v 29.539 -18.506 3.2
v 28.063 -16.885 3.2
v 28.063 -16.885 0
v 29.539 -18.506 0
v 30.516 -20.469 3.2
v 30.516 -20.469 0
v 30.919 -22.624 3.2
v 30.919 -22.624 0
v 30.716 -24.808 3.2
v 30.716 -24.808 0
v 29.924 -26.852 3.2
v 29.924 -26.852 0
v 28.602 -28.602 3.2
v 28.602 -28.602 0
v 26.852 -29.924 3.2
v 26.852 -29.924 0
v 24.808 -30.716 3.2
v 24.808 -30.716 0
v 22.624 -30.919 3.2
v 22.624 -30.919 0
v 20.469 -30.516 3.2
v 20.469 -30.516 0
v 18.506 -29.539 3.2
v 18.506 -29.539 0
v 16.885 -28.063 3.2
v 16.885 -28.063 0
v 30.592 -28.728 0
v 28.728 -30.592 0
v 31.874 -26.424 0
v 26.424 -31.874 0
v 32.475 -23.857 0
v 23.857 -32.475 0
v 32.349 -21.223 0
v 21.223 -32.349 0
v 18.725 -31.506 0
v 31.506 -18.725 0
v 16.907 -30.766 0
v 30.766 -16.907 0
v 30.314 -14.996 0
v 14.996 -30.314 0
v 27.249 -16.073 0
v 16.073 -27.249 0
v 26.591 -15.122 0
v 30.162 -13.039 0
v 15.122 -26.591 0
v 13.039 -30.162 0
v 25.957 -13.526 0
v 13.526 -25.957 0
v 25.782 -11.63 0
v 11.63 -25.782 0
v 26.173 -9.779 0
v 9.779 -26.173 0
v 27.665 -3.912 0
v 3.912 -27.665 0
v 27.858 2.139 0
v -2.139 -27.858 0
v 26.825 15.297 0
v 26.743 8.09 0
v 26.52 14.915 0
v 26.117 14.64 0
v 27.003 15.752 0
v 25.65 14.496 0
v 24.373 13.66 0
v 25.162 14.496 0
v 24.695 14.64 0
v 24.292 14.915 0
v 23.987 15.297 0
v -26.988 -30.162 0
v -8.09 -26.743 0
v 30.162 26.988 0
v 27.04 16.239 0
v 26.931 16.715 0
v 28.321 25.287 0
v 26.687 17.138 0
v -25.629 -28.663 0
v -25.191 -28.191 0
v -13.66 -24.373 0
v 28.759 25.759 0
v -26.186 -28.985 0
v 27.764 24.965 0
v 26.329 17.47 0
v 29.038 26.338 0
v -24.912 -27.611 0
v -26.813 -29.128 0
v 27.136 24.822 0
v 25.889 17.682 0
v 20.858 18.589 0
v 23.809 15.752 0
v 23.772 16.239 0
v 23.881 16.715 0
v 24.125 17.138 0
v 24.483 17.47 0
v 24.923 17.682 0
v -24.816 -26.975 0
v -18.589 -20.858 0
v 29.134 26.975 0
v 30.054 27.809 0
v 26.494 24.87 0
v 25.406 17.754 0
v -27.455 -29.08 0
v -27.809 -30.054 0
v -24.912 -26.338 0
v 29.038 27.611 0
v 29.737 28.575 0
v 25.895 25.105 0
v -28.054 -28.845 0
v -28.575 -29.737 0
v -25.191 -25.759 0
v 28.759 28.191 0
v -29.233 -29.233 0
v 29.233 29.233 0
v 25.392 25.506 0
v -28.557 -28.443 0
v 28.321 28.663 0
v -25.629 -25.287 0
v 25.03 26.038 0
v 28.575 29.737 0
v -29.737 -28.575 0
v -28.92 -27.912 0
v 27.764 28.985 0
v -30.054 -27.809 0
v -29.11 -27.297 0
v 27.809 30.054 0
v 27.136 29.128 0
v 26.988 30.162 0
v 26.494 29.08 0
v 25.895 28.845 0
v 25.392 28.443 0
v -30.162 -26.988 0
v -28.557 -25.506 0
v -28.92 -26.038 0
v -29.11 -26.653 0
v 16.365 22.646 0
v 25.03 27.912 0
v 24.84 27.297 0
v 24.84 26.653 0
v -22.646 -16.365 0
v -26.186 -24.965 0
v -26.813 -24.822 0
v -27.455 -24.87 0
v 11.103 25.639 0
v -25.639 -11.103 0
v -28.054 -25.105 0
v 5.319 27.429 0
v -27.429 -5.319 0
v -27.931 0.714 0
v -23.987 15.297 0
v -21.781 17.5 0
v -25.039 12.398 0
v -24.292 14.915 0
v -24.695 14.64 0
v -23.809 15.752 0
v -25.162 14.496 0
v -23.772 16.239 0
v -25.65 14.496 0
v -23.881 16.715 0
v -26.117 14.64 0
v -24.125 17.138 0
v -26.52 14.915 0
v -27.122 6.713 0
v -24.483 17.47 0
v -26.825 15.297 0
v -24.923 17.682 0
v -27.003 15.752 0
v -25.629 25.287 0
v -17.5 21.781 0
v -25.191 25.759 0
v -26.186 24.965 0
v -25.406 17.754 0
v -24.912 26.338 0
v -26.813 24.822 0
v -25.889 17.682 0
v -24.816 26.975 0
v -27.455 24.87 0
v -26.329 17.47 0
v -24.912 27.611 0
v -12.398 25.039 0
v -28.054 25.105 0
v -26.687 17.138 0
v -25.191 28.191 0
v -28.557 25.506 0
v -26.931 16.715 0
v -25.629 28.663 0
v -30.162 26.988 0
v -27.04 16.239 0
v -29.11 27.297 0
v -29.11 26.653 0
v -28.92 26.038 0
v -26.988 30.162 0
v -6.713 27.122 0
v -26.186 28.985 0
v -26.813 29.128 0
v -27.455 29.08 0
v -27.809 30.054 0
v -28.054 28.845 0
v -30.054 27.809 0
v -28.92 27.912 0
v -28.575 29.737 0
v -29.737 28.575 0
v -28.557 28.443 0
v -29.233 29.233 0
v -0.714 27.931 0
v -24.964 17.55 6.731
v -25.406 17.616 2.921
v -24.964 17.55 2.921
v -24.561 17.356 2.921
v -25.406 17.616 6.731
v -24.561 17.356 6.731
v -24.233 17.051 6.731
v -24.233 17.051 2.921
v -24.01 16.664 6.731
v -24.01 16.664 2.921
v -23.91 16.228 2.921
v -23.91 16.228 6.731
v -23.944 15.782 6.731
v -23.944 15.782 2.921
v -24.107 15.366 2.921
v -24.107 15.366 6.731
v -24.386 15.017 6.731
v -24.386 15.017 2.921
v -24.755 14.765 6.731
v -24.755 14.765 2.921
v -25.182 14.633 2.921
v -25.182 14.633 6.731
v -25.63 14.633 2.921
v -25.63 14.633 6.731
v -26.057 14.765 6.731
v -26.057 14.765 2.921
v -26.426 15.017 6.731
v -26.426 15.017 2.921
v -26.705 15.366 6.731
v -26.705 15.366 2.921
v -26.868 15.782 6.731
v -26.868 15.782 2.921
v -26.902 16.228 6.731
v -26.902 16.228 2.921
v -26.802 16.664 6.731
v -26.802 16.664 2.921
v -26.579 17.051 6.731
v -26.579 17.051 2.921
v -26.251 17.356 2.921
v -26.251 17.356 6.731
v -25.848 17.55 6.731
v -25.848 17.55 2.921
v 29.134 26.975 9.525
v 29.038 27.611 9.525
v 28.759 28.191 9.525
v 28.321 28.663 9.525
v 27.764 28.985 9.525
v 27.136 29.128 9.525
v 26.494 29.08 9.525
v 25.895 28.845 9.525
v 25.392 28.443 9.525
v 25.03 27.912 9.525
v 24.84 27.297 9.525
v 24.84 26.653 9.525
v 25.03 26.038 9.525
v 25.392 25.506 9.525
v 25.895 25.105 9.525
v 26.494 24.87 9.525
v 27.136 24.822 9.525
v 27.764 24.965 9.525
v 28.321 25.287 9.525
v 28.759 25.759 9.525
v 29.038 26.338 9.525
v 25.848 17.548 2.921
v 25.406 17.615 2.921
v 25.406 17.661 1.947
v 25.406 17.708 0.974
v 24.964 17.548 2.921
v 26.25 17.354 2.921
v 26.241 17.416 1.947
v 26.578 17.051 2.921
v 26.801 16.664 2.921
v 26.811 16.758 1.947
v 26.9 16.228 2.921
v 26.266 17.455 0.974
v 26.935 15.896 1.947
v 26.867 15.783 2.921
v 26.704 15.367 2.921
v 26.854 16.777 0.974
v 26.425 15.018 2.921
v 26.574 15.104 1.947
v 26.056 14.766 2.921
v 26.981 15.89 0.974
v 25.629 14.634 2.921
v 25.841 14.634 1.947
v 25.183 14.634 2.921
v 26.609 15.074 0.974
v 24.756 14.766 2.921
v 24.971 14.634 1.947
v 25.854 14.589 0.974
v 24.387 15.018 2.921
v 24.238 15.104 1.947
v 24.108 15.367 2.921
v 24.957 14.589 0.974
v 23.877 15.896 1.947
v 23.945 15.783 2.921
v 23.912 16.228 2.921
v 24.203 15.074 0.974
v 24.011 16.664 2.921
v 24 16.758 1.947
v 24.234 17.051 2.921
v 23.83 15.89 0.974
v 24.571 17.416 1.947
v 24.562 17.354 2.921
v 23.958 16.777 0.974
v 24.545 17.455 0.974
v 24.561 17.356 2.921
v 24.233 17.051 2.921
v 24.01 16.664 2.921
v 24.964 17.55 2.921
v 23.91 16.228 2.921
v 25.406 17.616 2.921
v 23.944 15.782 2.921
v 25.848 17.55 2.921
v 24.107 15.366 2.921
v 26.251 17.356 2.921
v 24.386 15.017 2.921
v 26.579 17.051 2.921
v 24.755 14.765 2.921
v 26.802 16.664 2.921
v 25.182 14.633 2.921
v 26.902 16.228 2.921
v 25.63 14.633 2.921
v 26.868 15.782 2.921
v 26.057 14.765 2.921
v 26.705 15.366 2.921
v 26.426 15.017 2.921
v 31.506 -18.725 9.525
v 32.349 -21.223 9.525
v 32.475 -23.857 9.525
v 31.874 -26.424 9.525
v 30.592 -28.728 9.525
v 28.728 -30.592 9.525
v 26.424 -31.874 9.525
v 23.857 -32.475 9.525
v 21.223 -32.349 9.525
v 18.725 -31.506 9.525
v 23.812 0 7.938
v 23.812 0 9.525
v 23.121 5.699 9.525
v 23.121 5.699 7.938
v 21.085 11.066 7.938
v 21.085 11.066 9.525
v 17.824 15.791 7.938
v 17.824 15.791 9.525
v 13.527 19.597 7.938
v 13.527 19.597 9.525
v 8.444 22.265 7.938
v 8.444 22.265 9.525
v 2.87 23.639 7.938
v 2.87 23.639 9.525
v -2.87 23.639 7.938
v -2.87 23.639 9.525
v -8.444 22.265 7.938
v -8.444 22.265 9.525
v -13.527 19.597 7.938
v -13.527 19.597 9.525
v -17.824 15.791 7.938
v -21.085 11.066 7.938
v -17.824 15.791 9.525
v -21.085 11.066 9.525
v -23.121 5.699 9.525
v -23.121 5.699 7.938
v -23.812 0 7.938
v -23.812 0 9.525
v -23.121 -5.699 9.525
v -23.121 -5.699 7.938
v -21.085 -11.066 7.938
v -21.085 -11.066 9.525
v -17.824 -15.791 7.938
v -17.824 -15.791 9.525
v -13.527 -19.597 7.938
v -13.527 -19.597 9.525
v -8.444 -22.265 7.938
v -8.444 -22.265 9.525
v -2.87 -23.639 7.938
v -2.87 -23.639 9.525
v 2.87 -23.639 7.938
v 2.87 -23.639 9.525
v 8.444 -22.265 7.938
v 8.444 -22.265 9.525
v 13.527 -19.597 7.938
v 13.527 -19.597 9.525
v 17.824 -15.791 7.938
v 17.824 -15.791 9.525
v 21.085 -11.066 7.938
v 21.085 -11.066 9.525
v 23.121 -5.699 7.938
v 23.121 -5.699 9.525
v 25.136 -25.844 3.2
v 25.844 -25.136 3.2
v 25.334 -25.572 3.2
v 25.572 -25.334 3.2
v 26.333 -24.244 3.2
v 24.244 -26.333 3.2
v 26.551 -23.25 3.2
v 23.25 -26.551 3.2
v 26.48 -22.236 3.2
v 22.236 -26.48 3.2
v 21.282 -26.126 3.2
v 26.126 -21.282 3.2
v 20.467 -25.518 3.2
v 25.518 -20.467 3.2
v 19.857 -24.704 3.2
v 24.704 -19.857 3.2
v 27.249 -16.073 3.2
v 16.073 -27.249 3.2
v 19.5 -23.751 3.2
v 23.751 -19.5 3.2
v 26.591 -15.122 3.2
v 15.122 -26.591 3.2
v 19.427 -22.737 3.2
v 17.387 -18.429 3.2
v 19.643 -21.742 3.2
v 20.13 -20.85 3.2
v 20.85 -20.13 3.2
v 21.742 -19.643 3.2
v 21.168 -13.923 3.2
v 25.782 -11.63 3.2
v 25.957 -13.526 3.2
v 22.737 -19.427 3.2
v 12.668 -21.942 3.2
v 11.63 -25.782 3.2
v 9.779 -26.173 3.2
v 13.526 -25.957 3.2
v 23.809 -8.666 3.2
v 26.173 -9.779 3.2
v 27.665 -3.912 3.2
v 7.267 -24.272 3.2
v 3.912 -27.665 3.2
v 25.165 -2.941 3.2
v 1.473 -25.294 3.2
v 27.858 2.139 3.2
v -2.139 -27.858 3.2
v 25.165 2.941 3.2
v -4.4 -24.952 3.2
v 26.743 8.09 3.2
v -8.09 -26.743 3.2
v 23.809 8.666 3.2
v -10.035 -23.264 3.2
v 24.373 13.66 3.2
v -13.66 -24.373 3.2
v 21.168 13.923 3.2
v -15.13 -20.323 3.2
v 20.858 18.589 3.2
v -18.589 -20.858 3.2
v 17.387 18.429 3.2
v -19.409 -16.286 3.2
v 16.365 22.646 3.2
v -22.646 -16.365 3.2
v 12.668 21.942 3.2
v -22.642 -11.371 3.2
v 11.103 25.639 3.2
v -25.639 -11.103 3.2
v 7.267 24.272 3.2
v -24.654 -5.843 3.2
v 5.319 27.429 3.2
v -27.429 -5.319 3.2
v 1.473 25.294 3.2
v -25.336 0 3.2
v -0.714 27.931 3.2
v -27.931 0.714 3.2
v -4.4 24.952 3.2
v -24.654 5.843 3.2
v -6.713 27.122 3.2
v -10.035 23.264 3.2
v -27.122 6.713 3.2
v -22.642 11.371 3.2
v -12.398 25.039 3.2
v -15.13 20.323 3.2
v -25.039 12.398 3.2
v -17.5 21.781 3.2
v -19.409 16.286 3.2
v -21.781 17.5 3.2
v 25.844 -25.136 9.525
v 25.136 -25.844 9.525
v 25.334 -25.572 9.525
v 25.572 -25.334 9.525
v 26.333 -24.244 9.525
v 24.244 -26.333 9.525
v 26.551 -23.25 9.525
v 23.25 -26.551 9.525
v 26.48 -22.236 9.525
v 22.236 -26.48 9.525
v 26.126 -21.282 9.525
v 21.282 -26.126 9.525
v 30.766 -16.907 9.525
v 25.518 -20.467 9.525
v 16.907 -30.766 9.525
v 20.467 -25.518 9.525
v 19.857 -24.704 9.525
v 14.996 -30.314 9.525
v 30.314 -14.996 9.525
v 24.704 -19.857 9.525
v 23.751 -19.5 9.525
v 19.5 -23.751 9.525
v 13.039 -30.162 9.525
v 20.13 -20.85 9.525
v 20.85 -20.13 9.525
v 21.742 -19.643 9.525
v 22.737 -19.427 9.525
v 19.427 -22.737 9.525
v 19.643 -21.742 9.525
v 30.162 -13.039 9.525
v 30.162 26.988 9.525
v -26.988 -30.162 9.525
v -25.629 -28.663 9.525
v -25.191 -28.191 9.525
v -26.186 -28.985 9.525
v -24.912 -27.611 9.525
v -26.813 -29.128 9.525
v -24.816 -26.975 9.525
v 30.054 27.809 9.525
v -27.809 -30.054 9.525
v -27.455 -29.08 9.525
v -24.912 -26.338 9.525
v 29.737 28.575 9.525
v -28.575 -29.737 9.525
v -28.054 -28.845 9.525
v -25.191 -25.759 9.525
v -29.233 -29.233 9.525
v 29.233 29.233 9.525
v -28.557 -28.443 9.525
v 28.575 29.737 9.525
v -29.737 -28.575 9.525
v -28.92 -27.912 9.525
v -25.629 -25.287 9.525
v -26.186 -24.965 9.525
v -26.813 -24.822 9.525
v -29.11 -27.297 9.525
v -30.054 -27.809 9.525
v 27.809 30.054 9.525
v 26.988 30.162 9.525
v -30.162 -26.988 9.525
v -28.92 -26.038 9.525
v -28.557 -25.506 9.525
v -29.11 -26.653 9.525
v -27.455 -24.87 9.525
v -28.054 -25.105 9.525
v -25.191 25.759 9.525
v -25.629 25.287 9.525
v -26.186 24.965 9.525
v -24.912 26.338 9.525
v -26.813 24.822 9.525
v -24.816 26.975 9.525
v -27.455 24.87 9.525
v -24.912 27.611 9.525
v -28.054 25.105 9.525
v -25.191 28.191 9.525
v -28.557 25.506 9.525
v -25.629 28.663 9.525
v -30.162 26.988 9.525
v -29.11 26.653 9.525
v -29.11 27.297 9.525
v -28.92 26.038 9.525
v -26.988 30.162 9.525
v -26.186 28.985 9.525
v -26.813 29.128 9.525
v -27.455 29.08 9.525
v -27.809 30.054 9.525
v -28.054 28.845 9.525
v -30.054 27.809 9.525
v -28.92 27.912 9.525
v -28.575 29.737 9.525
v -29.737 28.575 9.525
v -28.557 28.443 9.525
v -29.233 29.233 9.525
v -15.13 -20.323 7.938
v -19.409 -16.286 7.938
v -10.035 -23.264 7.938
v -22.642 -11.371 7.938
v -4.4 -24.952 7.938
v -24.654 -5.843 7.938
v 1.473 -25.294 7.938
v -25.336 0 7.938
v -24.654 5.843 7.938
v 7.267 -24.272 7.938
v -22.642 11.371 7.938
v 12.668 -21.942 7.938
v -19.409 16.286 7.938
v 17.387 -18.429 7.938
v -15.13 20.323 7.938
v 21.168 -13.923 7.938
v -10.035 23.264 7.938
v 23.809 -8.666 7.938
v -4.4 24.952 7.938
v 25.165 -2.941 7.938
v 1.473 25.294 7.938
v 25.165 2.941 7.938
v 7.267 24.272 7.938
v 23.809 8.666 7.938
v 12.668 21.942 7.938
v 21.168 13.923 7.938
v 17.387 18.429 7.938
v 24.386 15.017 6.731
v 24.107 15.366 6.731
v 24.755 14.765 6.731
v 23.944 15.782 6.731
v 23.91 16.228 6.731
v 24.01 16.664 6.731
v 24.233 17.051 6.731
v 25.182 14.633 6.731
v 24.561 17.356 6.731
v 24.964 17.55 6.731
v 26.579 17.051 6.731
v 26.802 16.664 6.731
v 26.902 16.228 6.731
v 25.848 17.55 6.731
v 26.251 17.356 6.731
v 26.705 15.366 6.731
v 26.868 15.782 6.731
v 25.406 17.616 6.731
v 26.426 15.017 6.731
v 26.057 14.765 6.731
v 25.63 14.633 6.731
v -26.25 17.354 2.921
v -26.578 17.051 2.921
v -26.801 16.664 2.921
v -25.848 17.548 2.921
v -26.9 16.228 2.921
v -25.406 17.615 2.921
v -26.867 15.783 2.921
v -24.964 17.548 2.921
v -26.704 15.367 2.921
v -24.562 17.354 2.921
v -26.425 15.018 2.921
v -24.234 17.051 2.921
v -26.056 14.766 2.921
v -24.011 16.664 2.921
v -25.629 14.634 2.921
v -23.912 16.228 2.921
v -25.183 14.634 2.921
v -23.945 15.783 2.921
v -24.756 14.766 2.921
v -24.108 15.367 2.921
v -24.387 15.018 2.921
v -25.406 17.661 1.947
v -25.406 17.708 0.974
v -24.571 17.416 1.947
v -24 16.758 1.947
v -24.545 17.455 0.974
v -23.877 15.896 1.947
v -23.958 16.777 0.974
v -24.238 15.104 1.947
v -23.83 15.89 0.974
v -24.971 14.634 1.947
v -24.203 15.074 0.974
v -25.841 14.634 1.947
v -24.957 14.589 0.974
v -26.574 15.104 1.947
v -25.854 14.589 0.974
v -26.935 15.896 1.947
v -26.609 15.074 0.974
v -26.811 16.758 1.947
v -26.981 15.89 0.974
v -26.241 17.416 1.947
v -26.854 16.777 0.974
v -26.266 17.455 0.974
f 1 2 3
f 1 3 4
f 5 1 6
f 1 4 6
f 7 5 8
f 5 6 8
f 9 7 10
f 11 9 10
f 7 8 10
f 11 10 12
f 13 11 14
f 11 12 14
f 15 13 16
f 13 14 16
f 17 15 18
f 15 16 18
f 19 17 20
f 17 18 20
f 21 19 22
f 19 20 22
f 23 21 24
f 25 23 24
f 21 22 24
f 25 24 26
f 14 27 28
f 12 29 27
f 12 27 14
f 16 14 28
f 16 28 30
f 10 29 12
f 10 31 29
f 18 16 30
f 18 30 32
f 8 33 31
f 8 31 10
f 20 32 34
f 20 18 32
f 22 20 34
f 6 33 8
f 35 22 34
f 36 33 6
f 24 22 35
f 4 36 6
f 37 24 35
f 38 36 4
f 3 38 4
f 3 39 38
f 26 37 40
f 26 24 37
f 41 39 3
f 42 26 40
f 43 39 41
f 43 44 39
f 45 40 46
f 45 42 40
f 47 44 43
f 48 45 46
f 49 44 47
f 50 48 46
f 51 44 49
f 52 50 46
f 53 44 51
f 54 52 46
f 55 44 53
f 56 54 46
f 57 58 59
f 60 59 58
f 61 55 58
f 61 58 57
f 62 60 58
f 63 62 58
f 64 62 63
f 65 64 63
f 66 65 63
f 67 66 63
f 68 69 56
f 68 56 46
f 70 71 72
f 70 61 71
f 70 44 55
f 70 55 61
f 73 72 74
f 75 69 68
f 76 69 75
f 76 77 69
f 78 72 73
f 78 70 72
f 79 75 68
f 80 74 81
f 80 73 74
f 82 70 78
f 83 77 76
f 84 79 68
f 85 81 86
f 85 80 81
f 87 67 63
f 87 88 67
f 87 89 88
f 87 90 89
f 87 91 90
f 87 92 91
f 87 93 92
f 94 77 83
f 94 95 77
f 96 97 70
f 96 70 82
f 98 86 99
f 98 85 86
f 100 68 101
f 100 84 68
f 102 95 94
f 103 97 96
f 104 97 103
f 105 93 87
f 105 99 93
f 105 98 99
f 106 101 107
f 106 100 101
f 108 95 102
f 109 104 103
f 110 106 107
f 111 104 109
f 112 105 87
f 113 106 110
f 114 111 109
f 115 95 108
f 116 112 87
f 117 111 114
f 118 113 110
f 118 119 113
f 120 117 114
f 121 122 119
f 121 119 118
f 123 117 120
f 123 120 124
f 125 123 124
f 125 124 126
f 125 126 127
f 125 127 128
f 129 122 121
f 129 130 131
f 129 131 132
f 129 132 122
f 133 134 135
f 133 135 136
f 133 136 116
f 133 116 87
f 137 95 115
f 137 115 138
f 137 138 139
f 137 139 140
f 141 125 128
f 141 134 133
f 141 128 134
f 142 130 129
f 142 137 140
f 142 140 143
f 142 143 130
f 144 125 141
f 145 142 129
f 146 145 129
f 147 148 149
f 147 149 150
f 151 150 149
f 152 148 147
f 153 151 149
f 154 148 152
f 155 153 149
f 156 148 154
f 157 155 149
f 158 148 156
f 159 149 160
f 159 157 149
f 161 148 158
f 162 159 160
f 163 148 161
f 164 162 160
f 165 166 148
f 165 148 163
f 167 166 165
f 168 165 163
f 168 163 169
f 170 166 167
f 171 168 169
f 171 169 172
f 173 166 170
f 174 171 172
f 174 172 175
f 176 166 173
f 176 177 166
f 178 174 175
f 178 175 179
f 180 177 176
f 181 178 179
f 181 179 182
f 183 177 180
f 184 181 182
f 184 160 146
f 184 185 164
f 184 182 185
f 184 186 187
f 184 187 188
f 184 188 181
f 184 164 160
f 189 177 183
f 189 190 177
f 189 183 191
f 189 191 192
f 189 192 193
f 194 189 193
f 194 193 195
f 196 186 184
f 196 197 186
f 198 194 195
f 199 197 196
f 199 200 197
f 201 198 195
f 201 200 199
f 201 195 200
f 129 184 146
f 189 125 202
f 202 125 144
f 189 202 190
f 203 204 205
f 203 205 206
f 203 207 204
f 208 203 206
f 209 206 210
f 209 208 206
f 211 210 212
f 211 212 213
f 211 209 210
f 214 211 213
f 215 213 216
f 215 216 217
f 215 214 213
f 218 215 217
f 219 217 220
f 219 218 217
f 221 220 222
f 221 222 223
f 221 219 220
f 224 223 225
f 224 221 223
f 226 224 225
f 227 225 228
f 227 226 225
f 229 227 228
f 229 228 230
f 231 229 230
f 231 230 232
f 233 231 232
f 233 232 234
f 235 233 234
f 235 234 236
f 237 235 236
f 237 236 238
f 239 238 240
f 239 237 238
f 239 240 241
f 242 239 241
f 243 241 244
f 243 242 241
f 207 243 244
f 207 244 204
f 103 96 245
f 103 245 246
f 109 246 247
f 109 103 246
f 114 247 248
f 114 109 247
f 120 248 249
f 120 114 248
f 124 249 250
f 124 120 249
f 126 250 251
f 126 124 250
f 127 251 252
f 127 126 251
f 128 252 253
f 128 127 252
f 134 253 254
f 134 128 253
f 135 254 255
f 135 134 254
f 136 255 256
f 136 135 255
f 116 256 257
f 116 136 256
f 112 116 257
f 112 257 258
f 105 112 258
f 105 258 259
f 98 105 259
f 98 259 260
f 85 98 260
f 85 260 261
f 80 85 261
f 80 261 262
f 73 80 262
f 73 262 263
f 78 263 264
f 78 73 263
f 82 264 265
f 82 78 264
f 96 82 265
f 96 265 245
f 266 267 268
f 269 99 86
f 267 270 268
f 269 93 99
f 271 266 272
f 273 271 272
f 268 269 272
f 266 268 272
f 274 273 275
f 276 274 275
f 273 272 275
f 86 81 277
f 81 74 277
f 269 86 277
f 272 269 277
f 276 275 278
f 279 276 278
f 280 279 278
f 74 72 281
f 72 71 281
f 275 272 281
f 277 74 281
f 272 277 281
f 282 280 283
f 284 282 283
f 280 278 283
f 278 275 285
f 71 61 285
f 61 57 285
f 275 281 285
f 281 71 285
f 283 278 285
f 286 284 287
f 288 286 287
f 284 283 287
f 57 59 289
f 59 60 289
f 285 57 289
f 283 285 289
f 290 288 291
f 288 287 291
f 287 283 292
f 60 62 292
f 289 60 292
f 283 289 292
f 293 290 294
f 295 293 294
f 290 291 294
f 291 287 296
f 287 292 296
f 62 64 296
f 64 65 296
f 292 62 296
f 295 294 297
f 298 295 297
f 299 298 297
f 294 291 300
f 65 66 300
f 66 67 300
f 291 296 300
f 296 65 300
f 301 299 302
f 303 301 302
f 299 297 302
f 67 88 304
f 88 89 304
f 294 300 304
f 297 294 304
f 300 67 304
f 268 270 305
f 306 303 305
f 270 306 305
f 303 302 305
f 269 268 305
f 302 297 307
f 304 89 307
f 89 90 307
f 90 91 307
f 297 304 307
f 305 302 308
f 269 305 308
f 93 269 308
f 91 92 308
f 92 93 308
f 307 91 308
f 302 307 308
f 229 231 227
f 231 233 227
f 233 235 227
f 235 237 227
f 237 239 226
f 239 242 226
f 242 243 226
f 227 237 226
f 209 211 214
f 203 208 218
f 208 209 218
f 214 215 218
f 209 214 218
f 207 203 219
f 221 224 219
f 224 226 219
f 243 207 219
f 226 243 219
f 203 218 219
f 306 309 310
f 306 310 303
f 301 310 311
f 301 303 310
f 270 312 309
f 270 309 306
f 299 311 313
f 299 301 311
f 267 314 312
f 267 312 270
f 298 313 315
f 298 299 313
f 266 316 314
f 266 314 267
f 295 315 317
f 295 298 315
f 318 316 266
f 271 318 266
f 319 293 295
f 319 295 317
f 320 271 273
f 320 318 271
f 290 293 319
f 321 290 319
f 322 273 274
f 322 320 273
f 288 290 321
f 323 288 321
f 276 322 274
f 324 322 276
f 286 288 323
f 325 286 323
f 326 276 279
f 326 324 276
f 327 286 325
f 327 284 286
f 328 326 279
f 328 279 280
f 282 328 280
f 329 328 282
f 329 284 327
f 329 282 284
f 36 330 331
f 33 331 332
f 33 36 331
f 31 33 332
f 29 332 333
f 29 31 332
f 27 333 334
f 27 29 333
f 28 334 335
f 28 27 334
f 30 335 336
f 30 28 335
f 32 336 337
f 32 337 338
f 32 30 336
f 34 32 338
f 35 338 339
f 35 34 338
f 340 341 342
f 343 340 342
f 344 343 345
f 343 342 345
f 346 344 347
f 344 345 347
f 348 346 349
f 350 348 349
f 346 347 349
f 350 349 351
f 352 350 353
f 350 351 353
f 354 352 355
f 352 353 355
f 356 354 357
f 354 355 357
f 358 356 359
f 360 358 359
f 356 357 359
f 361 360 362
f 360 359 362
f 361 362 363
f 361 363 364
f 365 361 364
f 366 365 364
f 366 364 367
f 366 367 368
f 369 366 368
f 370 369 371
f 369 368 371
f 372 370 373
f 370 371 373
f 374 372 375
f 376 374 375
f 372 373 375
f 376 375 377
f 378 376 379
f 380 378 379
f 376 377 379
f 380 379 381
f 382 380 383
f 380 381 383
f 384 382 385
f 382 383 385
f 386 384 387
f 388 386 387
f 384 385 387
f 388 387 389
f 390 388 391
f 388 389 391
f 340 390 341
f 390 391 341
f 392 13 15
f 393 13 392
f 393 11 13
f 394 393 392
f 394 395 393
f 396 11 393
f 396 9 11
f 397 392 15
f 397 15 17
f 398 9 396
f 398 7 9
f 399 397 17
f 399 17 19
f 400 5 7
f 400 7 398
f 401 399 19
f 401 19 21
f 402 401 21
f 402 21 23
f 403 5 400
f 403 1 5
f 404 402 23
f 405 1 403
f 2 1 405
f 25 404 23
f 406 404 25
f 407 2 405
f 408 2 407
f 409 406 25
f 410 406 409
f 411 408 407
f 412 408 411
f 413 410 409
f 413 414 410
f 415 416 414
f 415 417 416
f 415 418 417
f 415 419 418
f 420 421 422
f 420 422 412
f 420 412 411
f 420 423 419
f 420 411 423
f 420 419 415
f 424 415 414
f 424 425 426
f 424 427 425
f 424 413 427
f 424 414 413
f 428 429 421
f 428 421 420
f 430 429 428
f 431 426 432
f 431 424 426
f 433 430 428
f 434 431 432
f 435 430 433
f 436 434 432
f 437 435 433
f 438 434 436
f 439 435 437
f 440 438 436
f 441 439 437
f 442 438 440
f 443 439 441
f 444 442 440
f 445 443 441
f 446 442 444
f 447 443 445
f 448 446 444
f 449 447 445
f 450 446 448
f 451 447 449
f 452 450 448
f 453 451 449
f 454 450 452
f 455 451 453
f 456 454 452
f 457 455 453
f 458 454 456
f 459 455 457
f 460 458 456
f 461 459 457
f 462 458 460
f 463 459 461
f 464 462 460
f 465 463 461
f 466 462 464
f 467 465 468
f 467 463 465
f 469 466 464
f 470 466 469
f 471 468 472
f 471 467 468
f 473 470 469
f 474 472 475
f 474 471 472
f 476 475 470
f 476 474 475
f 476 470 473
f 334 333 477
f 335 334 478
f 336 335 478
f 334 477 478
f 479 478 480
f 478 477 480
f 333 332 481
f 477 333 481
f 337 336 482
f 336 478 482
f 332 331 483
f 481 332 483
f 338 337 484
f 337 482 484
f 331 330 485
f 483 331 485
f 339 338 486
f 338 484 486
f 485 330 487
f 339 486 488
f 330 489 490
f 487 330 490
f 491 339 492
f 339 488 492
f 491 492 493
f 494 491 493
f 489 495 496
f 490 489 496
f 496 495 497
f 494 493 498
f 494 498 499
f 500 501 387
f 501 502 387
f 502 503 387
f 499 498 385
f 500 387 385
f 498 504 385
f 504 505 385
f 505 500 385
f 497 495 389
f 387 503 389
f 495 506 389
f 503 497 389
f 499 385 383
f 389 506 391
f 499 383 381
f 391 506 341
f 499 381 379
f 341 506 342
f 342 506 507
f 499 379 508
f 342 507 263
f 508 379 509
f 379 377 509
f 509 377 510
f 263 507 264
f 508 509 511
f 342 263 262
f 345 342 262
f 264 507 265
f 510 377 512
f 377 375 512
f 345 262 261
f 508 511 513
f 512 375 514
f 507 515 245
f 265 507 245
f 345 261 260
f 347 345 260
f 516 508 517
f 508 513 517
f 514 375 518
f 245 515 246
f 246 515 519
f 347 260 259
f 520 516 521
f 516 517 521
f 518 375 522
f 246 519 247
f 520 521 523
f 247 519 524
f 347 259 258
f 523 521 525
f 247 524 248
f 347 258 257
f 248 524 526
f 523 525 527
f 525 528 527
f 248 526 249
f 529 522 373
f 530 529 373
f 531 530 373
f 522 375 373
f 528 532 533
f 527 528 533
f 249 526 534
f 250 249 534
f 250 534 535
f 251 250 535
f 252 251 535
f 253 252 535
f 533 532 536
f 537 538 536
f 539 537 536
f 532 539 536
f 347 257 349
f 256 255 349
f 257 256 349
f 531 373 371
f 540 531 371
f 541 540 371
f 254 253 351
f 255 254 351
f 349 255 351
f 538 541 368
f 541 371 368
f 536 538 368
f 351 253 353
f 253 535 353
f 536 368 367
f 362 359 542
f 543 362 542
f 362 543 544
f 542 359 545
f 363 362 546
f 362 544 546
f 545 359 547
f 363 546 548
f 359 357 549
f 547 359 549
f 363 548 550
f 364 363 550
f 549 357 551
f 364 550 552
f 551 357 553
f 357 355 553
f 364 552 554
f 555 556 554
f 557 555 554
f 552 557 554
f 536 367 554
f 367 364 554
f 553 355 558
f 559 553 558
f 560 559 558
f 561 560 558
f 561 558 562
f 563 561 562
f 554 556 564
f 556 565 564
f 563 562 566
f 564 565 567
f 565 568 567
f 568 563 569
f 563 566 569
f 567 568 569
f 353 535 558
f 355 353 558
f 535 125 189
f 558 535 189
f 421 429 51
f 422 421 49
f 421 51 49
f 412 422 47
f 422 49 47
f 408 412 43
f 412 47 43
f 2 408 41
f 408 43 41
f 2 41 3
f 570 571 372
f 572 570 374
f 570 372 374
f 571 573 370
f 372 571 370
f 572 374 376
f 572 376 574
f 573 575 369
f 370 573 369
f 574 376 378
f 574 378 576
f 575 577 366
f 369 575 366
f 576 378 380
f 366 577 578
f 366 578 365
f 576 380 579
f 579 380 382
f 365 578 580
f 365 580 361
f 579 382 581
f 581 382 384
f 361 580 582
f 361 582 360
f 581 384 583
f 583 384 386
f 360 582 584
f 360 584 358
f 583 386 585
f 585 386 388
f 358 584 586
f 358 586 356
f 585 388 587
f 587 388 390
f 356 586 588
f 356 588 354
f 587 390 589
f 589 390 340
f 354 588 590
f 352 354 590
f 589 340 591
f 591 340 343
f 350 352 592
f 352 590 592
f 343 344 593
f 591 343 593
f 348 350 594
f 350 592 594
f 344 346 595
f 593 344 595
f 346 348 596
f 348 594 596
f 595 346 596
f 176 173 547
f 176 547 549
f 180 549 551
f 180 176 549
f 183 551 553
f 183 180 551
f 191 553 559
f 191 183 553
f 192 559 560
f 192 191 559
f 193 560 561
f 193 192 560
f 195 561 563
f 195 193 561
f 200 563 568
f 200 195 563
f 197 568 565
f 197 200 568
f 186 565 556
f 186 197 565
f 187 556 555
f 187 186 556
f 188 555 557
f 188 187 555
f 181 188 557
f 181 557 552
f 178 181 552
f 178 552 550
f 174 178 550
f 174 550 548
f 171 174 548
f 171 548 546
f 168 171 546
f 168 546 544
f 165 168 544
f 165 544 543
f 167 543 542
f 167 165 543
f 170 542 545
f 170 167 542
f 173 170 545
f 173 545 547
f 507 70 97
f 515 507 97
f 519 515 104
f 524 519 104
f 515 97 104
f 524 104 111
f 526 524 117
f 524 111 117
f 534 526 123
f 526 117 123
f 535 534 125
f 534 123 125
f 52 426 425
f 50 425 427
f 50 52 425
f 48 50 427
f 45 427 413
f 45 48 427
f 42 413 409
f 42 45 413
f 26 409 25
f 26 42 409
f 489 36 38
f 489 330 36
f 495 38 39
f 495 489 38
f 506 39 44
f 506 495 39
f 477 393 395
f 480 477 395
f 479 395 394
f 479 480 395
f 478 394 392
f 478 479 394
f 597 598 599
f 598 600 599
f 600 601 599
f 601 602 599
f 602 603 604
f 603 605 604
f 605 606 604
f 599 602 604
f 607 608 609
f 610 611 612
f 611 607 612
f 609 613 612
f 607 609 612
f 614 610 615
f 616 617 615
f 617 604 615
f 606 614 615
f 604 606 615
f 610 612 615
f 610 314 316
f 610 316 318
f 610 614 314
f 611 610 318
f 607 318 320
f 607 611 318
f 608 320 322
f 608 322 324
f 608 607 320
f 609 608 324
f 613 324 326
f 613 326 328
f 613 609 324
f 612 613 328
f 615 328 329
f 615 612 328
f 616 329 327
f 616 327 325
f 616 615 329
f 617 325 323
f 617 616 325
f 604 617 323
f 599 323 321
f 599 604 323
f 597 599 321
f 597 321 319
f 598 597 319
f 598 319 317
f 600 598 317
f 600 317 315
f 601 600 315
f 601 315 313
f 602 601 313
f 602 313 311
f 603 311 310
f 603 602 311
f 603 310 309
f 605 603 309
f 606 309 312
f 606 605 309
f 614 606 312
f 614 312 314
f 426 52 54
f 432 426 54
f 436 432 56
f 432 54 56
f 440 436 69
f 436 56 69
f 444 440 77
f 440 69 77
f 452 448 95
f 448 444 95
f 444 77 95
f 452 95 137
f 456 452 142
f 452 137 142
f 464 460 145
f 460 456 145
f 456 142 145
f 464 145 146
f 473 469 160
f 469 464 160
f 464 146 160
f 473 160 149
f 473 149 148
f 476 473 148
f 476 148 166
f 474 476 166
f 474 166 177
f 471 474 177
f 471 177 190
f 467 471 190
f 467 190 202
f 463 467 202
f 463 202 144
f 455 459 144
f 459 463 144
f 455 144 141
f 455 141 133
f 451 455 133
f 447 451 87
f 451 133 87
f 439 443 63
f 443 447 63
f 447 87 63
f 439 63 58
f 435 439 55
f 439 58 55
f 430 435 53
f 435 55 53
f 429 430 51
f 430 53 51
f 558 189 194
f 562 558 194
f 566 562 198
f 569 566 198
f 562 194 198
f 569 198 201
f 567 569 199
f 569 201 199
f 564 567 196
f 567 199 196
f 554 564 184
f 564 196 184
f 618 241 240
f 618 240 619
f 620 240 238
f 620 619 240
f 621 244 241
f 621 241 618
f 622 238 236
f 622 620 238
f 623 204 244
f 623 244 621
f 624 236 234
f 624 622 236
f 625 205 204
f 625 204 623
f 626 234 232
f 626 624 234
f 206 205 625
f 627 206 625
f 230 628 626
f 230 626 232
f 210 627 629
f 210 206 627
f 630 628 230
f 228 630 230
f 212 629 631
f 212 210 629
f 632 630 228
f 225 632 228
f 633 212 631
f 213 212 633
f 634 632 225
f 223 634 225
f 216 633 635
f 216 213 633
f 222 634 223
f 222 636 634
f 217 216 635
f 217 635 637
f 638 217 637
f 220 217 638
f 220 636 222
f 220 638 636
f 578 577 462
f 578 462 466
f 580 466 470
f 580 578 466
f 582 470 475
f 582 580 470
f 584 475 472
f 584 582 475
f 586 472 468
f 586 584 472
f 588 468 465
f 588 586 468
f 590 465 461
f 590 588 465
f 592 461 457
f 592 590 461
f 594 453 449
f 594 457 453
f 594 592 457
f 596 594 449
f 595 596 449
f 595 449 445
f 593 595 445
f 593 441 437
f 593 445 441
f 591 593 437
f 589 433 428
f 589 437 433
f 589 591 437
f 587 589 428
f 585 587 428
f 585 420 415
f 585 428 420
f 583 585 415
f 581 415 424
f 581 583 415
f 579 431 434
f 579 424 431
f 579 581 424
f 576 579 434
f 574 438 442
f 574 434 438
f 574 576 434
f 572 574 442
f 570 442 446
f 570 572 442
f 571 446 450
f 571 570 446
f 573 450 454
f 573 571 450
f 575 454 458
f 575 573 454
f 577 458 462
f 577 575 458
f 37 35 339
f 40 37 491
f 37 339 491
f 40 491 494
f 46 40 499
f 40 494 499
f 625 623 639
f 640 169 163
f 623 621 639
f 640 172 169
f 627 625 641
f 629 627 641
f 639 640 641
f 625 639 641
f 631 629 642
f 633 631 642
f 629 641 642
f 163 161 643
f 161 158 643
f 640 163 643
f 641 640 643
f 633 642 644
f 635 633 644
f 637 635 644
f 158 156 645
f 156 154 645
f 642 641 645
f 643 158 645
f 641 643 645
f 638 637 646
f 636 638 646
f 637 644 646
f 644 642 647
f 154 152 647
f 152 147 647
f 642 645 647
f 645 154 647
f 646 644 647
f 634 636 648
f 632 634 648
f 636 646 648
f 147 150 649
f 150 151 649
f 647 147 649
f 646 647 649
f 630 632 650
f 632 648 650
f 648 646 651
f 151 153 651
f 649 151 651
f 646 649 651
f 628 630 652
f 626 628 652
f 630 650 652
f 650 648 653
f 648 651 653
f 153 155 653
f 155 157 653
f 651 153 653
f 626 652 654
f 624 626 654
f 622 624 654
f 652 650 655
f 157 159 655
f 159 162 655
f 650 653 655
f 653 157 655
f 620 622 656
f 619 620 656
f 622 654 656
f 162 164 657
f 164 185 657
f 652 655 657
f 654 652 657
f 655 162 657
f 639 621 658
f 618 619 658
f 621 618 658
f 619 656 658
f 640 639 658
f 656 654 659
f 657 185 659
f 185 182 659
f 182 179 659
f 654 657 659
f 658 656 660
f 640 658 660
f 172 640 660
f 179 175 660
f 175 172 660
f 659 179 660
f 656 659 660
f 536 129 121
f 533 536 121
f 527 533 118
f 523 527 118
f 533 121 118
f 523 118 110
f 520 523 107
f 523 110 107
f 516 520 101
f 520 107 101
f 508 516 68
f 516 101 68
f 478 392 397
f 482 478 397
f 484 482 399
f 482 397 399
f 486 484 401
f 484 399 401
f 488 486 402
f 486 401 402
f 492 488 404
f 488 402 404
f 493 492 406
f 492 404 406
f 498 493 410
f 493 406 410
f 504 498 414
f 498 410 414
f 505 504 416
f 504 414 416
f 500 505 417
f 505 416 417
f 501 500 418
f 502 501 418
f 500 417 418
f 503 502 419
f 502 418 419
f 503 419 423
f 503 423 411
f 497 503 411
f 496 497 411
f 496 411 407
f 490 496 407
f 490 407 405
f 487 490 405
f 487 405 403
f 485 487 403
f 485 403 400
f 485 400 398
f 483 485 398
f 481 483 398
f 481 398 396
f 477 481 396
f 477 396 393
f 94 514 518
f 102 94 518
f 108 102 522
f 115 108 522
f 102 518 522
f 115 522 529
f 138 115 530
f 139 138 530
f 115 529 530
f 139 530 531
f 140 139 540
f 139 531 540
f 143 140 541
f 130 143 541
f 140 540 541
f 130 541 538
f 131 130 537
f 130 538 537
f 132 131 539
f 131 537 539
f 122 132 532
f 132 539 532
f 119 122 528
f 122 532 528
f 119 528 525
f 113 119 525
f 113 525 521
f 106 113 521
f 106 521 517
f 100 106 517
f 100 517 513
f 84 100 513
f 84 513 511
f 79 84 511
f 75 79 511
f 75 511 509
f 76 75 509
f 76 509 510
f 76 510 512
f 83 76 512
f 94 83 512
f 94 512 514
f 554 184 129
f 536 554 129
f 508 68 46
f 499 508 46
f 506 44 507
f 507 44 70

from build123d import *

# Parameters (mm, degrees)
SKETCH1_R                = 2.159
SKETCH1_R_2              = 28.5115
BOSS_EXTRUDE1_DEPTH      = 9.525
SKETCH1_4_R              = 28.5115
SKETCH1_4_R_2            = 23.8125
FLUSH_BEZEL_DEPTH        = 9.525
SKETCH1_5_R              = 28.5115
SKETCH1_5_R_2            = 23.8125
BOSS_EXTRUDE4_DEPTH      = 6.35
SKETCH2_R                = 25.3365
CUT_EXTRUDE1_DEPTH       = 7.35
CUT_EXTRUDE1_DEPTH_BACK  = 9.525
SKETCH3_R                = 28.5115
CUT_EXTRUDE2_DEPTH       = 7.35
SKETCH4_R                = 25.3365
SKETCH4_R_2              = 23.8125
BOSS_EXTRUDE7_DEPTH      = 1.5875
M6_CLEARANCE_HOLE1_D     = 7.14248
M6_CLEARANCE_HOLE1_DEPTH = 9.525
SKETCH8_R                = 2.159
BOSS_EXTRUDE8_DEPTH      = 9.525
SKETCH9_R                = 2.159
CUT_EXTRUDE3_DEPTH       = 10.525
SKETCH10_R               = 27.94
CUT_EXTRUDE4_DEPTH       = 3.2004
BOSS_EXTRUDE10_DEPTH     = 9.525
SKETCH12_R               = 7.9375
CUT_EXTRUDE5_DEPTH       = 3.2004
FILLET6_R                = 12.7
FILLET7_R                = 6.35
HOLE1_AT_2_COUNT         = 2
HOLE1_AT_2_PITCH         = 50.811879198
SKETCH18_W               = 1.5
SKETCH18_H               = 3.81
HOLE2_AT_2_COUNT         = 2
HOLE2_AT_2_PITCH         = 50.811879198


with BuildPart() as part:
    # Sketch1 → Boss-Extrude1 (new body)
    with BuildSketch(Plane.XY):
        with BuildLine():
            ThreePointArc((26.9875, -30.1625), (29.23256403, -29.23256403), (30.1625, -26.9875))
            Line((30.1625, -26.9875), (30.1625, 26.9875))
            ThreePointArc((30.1625, 26.9875), (29.23256403, 29.23256403), (26.9875, 30.1625))
            Line((26.9875, 30.1625), (-26.9875, 30.1625))
            ThreePointArc((-26.9875, 30.1625), (-29.23256403, 29.23256403), (-30.1625, 26.9875))
            Line((-30.1625, 26.9875), (-30.1625, -26.9875))
            ThreePointArc((-30.1625, -26.9875), (-29.23256403, -29.23256403), (-26.9875, -30.1625))
            Line((-26.9875, -30.1625), (26.9875, -30.1625))
        make_face()
        with Locations((26.9748, -26.9748)):
            Circle(SKETCH1_R, mode=Mode.SUBTRACT)
        with Locations((-26.9748, 26.9748)):
            Circle(SKETCH1_R, mode=Mode.SUBTRACT)
        Circle(SKETCH1_R_2, mode=Mode.SUBTRACT)
        with Locations((26.9748, 26.9748)):
            Circle(SKETCH1_R, mode=Mode.SUBTRACT)
    extrude(amount=BOSS_EXTRUDE1_DEPTH)

    # Sketch1_4 → Flush Bezel (add)
    with BuildSketch(Plane.XY):
        Circle(SKETCH1_4_R)
        Circle(SKETCH1_4_R_2, mode=Mode.SUBTRACT)
    extrude(amount=FLUSH_BEZEL_DEPTH)

    # Sketch1_5 → Boss-Extrude4 (add)
    with BuildSketch(Plane.XY):
        Circle(SKETCH1_5_R)
        Circle(SKETCH1_5_R_2, mode=Mode.SUBTRACT)
    extrude(amount=-BOSS_EXTRUDE4_DEPTH)

    # Sketch2 → Cut-Extrude1 (cut, two sides)
    with BuildSketch(Plane(origin=(0, 0, 0), x_dir=(-1, 0, 0), z_dir=(0, 0, -1))) as cut_extrude1_sk:
        Circle(SKETCH2_R)
    extrude(amount=CUT_EXTRUDE1_DEPTH, mode=Mode.SUBTRACT)
    extrude(cut_extrude1_sk.sketch, amount=-CUT_EXTRUDE1_DEPTH_BACK, mode=Mode.SUBTRACT)

    # Sketch3 → Cut-Extrude2 (cut, through all)
    with BuildSketch(Plane(origin=(0, 0, 0), x_dir=(-1, 0, 0), z_dir=(0, 0, -1))):
        Circle(SKETCH3_R)
    extrude(amount=CUT_EXTRUDE2_DEPTH, mode=Mode.SUBTRACT)

    # Sketch4 → Boss-Extrude7 (add)
    with BuildSketch(Plane.XY.offset(9.525)):
        Circle(SKETCH4_R)
        Circle(SKETCH4_R_2, mode=Mode.SUBTRACT)
    extrude(amount=-BOSS_EXTRUDE7_DEPTH)

    # M6 Clearance Hole1
    with Locations(Plane.XY.offset(9.525)):
        with Locations((22.98945567, -22.98945567)):
            Hole(M6_CLEARANCE_HOLE1_D / 2, depth=M6_CLEARANCE_HOLE1_DEPTH)

    # Sketch8 → Boss-Extrude8 (add, through all)
    with BuildSketch(Plane.XY.offset(9.525)):
        with Locations((26.9748, -26.9748)):
            Circle(SKETCH8_R)
    extrude(amount=-BOSS_EXTRUDE8_DEPTH)

    # Sketch9 → Cut-Extrude3 (cut, through all)
    with BuildSketch(Plane.XY.offset(9.525)):
        with Locations((-26.9748, -26.9748)):
            Circle(SKETCH9_R)
    extrude(amount=-CUT_EXTRUDE3_DEPTH, mode=Mode.SUBTRACT)

    # Sketch10 → Cut-Extrude4 (cut)
    with BuildSketch(Plane(origin=(0, 0, 0), x_dir=(-1, 0, 0), z_dir=(0, 0, -1))):
        Circle(SKETCH10_R)
    extrude(amount=-CUT_EXTRUDE4_DEPTH, mode=Mode.SUBTRACT)

    # Sketch13 → Boss-Extrude10 (add)
    with BuildSketch(Plane(origin=(0, 0, 0), x_dir=(-1, 0, 0), z_dir=(0, 0, -1))):
        with BuildLine():
            Line((-16.722633506, -30.1625), (-26.9875, -30.1625))
            ThreePointArc((-26.9875, -30.1625), (-29.23256403, -29.23256403), (-30.1625, -26.9875))
            Line((-30.1625, -26.9875), (-30.1625, -16.722633506))
            ThreePointArc((-30.1625, -16.722633506), (-29.724647761, -29.724647761), (-16.722633506, -30.1625))
        make_face()
    extrude(amount=-BOSS_EXTRUDE10_DEPTH)

    # Sketch12 → Cut-Extrude5 (cut)
    with BuildSketch(Plane(origin=(0, 0, 0), x_dir=(-1, 0, 0), z_dir=(0, 0, -1))):
        with Locations((-22.98945567, -22.98945567)):
            Circle(SKETCH12_R)
    extrude(amount=-CUT_EXTRUDE5_DEPTH, mode=Mode.SUBTRACT)

    # Fillet6
    fillet6_edges = [part.edges().sort_by_distance(p)[0] for p in [
        (30.1625, -16.722633506, 4.7625),
        (16.722633506, -30.1625, 4.7625),
    ]]
    fillet(fillet6_edges, radius=FILLET6_R)

    # Fillet7
    fillet7_edges = [part.edges().sort_by_distance(p)[0] for p in [
        (23.527276854, -15.070197206, 1.6002),
        (15.070197206, -23.527276854, 1.6002),
    ]]
    fillet(fillet7_edges, radius=FILLET7_R)

    # Sketch14 → Hole1 (revolve, cut)
    with BuildSketch(Plane(origin=(-25.405939599, 16.116198413, 0), x_dir=(0, 1, 0), z_dir=(1, 0, 0))):
        Polygon((0, 0), (0, 2.921), (1.4986, 2.921), (1.6383, 0), align=None)
    hole1 = revolve(axis=Axis((-25.405939599, 16.116198413, 110), (0, 0, -1)), mode=Mode.SUBTRACT)

    # Hole1 at 2: Hole1 ×2
    with Locations(*[(i * HOLE1_AT_2_PITCH, 0, 0) for i in range(1, HOLE1_AT_2_COUNT)]):
        add(hole1, mode=Mode.SUBTRACT)

    # Sketch18 → Hole2 (revolve, cut)
    with BuildSketch(Plane(origin=(25.405939599, 16.116198413, 2.921), x_dir=(0, 1, 0), z_dir=(1, 0, 0))):
        with Locations((0.75, 1.905)):
            Rectangle(SKETCH18_W, SKETCH18_H)
    hole2 = revolve(axis=Axis((25.405939599, 16.116198413, 112.921), (0, 0, -1)), mode=Mode.SUBTRACT)

    # Hole2 at 2: Hole2 ×2
    with Locations(*[(-i * HOLE2_AT_2_PITCH, 0, 0) for i in range(1, HOLE2_AT_2_COUNT)]):
        add(hole2, mode=Mode.SUBTRACT)


solid = part.part
